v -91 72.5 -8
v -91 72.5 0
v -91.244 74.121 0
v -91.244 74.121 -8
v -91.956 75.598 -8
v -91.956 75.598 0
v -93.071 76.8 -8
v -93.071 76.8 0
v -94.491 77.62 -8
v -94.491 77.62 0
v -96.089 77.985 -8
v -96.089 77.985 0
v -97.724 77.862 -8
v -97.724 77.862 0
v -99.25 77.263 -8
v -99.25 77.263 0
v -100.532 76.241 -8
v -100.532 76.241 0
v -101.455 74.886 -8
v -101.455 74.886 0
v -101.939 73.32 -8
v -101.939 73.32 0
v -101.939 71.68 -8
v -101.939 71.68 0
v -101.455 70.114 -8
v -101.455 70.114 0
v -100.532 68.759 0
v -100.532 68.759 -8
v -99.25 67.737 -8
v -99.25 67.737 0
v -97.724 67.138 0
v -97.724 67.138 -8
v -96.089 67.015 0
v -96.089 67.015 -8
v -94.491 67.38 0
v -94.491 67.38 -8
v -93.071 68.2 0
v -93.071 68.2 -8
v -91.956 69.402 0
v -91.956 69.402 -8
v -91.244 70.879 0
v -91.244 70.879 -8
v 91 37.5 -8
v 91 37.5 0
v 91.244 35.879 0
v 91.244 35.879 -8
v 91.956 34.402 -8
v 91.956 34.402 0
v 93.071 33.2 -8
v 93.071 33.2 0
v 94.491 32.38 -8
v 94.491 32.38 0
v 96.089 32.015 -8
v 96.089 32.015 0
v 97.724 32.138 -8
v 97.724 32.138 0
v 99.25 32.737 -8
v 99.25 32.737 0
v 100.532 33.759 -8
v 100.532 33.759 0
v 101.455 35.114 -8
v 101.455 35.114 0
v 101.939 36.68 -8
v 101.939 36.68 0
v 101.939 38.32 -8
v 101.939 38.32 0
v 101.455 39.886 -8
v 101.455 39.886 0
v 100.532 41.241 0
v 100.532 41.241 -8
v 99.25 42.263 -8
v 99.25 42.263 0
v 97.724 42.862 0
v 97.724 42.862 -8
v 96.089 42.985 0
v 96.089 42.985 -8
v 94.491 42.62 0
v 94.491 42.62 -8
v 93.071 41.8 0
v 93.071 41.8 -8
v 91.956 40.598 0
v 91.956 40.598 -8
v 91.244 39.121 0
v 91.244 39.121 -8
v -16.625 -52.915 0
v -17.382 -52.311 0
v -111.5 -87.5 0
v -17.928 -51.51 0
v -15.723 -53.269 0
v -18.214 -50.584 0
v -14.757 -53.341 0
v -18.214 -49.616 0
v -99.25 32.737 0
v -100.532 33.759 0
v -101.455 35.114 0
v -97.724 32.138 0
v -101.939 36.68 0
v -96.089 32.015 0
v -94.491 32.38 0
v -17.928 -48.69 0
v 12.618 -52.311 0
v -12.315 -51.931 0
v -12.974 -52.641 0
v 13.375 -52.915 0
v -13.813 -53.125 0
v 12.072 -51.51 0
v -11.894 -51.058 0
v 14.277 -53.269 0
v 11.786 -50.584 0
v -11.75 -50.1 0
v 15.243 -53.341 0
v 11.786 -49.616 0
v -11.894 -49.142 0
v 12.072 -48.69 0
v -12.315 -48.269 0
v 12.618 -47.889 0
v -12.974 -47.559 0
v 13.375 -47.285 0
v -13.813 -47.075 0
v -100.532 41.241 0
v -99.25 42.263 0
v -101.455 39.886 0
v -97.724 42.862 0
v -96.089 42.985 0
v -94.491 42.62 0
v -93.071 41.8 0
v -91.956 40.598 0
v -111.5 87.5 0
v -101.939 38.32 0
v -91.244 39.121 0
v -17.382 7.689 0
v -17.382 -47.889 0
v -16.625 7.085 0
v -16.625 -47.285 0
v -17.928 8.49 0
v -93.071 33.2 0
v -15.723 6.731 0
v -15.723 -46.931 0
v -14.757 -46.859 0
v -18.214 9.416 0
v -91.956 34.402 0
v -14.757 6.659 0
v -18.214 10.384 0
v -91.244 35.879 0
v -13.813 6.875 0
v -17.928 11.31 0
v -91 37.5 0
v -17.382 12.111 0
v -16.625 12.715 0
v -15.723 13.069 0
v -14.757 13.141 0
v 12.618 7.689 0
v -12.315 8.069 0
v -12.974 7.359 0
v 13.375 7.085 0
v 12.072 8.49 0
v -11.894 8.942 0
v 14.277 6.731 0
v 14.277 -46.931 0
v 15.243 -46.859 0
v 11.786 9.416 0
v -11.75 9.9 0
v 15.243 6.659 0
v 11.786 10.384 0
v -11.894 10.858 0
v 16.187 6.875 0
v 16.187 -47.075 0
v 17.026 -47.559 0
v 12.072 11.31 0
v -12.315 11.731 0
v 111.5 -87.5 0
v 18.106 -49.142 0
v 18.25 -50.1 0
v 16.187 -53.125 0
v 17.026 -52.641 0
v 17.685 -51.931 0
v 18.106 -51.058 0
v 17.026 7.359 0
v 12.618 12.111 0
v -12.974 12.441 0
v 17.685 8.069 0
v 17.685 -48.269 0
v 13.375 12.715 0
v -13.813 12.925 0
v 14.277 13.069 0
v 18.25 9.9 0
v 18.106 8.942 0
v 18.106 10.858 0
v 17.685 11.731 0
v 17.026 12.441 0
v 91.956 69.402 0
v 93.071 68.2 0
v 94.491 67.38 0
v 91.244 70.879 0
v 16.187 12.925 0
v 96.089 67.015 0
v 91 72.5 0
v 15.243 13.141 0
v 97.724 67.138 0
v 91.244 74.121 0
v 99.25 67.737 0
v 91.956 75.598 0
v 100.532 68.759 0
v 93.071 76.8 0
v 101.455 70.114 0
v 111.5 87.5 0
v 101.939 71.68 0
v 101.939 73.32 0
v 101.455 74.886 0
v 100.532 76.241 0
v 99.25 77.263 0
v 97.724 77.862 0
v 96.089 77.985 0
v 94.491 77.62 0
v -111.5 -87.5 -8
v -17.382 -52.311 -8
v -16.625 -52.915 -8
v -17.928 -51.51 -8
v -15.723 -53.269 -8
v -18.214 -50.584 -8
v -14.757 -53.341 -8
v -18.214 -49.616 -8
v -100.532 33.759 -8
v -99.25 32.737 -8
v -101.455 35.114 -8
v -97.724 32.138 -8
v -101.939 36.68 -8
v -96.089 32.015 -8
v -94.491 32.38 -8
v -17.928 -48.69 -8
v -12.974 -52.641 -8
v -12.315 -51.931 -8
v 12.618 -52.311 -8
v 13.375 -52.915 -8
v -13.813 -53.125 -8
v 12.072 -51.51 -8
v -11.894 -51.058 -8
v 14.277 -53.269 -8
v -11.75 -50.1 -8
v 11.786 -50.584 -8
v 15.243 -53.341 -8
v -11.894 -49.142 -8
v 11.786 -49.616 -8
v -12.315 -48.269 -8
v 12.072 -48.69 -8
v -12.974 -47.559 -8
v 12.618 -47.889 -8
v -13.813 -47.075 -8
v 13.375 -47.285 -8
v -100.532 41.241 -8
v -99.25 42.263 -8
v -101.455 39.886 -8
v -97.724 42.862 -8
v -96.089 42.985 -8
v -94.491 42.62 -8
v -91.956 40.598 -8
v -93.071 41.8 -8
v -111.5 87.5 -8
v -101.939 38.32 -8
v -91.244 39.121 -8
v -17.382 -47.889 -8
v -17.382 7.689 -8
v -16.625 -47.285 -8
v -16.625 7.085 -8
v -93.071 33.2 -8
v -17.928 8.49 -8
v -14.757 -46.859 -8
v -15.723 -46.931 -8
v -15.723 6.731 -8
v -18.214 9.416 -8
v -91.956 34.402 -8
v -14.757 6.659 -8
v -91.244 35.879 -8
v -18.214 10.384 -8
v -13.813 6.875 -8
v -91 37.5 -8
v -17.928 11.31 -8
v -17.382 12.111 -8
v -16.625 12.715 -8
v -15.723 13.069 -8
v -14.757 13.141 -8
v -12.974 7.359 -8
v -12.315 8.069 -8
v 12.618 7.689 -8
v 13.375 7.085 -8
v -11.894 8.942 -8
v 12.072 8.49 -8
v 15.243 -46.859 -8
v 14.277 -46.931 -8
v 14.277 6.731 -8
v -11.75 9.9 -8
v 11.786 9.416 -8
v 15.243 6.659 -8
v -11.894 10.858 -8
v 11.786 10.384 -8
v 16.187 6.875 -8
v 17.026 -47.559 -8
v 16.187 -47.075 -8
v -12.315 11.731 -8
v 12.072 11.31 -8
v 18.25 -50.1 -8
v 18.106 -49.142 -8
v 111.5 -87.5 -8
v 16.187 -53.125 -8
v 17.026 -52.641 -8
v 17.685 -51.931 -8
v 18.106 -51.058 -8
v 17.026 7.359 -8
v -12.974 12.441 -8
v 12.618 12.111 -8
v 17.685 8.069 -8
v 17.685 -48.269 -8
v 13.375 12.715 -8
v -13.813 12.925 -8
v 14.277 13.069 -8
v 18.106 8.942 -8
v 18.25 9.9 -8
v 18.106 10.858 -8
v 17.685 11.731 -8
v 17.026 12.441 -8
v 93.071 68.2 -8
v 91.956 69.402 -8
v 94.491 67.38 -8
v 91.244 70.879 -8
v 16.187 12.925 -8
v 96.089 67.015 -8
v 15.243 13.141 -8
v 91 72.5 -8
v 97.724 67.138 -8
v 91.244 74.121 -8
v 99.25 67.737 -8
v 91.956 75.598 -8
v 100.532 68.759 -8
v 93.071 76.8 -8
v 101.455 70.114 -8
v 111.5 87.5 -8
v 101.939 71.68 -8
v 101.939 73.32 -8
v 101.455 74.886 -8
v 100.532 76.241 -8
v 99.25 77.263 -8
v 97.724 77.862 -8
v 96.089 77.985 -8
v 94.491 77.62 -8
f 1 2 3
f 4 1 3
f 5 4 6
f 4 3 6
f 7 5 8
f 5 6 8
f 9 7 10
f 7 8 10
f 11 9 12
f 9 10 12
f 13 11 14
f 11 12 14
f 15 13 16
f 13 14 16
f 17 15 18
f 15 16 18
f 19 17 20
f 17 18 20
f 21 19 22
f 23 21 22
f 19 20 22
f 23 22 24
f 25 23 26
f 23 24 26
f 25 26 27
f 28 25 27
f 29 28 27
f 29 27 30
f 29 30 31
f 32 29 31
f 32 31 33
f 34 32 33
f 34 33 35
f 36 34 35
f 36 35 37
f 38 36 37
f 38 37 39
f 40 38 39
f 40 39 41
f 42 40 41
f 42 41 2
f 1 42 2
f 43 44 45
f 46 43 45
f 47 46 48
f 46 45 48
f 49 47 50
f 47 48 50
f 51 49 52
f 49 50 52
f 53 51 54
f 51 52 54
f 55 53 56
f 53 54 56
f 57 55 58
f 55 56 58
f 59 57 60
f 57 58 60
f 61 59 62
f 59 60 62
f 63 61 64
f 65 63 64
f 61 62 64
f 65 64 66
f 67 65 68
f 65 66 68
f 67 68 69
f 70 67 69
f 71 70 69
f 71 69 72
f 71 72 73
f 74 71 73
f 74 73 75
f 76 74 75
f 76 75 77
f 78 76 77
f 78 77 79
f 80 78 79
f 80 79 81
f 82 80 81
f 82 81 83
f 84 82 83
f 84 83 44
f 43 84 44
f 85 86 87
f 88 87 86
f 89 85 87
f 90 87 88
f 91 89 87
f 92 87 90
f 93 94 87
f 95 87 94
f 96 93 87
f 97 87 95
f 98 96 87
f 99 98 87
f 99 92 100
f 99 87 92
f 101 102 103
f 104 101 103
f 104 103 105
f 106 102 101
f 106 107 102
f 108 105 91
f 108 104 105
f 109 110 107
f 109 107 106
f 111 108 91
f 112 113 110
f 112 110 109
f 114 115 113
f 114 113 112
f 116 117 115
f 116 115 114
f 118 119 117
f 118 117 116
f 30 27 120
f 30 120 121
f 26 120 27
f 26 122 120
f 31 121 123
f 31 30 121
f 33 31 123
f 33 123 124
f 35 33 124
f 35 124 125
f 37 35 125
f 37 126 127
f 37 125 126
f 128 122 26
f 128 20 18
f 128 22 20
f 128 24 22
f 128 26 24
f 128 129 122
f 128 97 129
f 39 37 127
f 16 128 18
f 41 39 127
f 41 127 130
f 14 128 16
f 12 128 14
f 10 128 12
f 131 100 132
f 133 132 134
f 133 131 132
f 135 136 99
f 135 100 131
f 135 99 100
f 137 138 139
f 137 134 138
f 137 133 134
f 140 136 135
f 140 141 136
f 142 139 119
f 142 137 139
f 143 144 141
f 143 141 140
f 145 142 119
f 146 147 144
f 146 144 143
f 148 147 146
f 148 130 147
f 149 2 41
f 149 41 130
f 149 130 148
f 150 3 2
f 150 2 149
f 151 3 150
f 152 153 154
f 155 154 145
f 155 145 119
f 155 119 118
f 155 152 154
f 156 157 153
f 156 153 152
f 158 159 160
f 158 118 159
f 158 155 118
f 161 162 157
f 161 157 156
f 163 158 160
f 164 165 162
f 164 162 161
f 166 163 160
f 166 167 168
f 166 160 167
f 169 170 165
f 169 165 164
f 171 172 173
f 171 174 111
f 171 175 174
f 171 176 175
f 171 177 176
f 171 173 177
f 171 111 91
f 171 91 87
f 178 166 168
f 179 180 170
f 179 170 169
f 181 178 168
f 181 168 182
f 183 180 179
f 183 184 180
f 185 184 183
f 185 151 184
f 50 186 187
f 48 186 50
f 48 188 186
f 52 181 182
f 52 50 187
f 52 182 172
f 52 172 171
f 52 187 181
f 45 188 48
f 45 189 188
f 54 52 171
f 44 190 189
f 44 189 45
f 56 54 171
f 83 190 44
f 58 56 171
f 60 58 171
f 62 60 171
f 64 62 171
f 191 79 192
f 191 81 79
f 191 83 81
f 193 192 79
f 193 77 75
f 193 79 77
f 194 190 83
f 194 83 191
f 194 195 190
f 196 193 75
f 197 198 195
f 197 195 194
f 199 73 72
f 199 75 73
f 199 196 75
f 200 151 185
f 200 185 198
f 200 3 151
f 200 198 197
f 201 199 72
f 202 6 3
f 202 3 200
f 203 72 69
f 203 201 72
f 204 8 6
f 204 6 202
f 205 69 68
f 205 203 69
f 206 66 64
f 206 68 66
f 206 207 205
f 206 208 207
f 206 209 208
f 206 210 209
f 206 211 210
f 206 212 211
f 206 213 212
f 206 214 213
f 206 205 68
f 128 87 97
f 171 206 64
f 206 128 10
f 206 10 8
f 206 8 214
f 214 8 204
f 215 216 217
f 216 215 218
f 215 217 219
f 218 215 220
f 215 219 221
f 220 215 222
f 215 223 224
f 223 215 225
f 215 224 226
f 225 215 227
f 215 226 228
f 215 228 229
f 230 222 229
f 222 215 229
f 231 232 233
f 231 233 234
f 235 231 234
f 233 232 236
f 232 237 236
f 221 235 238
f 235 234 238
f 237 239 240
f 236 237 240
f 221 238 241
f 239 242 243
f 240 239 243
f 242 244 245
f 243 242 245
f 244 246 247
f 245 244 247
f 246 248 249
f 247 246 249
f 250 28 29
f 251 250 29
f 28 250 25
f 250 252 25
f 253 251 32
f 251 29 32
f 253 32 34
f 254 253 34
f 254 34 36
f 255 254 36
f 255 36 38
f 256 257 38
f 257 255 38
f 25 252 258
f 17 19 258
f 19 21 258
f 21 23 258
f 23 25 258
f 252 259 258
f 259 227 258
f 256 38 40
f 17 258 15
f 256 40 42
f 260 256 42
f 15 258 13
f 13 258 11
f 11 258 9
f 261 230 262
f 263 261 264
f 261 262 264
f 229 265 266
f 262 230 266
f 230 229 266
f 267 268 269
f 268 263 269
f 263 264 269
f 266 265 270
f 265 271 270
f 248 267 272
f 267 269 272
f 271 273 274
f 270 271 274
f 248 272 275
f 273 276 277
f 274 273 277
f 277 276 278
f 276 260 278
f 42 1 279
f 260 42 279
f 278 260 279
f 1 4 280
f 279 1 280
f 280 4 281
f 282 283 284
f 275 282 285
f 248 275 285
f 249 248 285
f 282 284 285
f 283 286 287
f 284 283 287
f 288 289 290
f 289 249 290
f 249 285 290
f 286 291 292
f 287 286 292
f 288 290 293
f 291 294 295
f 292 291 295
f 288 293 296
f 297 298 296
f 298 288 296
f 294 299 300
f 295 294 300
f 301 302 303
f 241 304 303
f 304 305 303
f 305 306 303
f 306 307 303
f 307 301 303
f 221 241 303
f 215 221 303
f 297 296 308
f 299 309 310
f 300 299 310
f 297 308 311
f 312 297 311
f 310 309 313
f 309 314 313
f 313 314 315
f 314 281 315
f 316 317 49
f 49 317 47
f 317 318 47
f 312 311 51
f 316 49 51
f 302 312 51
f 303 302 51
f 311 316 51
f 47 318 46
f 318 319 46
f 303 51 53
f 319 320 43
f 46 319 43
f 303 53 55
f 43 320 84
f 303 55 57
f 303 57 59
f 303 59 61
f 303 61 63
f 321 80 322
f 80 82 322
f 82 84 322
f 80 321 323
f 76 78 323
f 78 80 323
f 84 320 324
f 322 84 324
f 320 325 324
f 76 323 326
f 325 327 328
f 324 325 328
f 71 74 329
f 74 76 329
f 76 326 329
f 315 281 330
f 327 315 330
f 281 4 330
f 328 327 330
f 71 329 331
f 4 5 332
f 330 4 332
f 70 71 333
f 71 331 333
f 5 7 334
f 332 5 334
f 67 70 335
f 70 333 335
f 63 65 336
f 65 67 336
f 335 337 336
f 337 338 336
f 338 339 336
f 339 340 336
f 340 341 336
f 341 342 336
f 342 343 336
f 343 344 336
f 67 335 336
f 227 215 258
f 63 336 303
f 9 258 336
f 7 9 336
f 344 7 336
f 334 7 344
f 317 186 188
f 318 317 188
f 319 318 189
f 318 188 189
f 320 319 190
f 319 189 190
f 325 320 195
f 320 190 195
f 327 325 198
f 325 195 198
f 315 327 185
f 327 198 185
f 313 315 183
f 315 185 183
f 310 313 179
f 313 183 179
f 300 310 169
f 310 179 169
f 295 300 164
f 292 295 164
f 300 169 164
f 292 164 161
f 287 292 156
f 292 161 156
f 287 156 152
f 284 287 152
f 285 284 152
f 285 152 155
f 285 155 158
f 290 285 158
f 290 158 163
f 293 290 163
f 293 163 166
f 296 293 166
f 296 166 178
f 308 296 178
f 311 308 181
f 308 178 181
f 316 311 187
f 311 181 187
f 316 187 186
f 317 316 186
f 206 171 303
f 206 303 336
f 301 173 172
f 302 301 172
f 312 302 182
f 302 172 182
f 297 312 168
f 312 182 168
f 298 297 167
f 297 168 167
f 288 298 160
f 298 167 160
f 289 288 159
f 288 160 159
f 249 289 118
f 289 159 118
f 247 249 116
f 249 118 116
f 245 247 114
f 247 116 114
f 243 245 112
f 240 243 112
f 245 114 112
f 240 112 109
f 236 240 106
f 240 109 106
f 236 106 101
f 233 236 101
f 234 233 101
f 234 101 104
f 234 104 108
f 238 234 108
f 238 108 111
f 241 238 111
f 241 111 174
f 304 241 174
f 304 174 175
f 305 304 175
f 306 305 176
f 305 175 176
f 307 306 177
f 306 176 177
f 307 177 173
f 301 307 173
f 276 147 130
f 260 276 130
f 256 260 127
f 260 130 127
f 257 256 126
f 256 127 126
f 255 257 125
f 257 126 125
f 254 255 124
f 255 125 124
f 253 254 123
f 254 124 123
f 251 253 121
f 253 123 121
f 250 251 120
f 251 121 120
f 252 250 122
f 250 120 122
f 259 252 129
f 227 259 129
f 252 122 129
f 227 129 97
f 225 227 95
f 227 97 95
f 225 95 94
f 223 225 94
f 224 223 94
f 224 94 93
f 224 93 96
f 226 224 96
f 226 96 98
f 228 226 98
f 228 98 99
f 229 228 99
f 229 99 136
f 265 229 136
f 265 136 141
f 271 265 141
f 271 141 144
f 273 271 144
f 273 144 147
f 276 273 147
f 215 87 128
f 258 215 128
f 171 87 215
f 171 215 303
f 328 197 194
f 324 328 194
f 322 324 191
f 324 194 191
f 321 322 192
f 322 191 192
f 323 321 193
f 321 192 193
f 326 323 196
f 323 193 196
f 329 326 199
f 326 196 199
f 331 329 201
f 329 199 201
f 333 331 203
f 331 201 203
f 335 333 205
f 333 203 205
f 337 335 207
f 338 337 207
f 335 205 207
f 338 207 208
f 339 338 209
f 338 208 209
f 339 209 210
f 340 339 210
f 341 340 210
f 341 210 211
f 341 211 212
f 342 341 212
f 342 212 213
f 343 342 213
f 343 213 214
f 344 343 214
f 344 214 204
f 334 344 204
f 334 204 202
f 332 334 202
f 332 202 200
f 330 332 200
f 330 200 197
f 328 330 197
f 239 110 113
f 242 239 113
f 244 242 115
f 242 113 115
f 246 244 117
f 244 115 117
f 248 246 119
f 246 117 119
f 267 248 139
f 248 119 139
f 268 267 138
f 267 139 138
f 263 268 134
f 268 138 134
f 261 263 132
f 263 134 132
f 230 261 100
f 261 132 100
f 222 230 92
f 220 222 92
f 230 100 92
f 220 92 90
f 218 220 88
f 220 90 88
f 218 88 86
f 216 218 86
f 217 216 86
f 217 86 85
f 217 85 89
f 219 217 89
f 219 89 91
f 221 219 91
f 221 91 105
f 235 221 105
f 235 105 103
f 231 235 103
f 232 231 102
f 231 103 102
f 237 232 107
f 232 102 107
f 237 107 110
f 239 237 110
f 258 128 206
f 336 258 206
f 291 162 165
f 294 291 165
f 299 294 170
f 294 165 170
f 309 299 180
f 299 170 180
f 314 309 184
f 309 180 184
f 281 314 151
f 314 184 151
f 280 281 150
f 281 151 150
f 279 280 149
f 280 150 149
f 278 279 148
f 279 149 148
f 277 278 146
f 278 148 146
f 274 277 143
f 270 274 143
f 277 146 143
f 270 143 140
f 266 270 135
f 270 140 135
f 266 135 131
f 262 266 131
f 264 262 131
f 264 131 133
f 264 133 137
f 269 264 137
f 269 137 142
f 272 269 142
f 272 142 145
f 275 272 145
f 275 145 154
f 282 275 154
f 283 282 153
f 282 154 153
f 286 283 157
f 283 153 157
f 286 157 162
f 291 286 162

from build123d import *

# Parameters (mm, degrees)
SKETCH1_W          = 223
SKETCH1_H          = 175
SKETCH1_R          = 3.25
BASE_FLANGE1_DEPTH = 8
SKETCH2_R          = 5.5
CUT_EXTRUDE1_DEPTH = 142.959501267


# Sheet-metal steps are written as plain solids
with BuildPart() as part:
    # Sketch1 → Base-Flange1 (new body)
    with BuildSketch(Plane.XY):
        Rectangle(SKETCH1_W, SKETCH1_H)
        with Locations((15, 9.9)):
            Circle(SKETCH1_R, mode=Mode.SUBTRACT)
        with Locations((-15, 9.9)):
            Circle(SKETCH1_R, mode=Mode.SUBTRACT)
        with Locations((-15, -50.1)):
            Circle(SKETCH1_R, mode=Mode.SUBTRACT)
        with Locations((15, -50.1)):
            Circle(SKETCH1_R, mode=Mode.SUBTRACT)
    extrude(amount=-BASE_FLANGE1_DEPTH)

    # Sketch2 → Cut-Extrude1 (cut, through all)
    with BuildSketch(Plane.XY):
        with Locations((-96.5, 72.5)):
            Circle(SKETCH2_R)
        with Locations((-96.5, 37.5)):
            Circle(SKETCH2_R)
        with Locations(Location((96.5, 37.5, 0), (0, 0, 180))):
            Circle(SKETCH2_R)
        with Locations(Location((96.5, 72.5, 0), (0, 0, 180))):
            Circle(SKETCH2_R)
    extrude(amount=-CUT_EXTRUDE1_DEPTH, mode=Mode.SUBTRACT)


solid = part.part
